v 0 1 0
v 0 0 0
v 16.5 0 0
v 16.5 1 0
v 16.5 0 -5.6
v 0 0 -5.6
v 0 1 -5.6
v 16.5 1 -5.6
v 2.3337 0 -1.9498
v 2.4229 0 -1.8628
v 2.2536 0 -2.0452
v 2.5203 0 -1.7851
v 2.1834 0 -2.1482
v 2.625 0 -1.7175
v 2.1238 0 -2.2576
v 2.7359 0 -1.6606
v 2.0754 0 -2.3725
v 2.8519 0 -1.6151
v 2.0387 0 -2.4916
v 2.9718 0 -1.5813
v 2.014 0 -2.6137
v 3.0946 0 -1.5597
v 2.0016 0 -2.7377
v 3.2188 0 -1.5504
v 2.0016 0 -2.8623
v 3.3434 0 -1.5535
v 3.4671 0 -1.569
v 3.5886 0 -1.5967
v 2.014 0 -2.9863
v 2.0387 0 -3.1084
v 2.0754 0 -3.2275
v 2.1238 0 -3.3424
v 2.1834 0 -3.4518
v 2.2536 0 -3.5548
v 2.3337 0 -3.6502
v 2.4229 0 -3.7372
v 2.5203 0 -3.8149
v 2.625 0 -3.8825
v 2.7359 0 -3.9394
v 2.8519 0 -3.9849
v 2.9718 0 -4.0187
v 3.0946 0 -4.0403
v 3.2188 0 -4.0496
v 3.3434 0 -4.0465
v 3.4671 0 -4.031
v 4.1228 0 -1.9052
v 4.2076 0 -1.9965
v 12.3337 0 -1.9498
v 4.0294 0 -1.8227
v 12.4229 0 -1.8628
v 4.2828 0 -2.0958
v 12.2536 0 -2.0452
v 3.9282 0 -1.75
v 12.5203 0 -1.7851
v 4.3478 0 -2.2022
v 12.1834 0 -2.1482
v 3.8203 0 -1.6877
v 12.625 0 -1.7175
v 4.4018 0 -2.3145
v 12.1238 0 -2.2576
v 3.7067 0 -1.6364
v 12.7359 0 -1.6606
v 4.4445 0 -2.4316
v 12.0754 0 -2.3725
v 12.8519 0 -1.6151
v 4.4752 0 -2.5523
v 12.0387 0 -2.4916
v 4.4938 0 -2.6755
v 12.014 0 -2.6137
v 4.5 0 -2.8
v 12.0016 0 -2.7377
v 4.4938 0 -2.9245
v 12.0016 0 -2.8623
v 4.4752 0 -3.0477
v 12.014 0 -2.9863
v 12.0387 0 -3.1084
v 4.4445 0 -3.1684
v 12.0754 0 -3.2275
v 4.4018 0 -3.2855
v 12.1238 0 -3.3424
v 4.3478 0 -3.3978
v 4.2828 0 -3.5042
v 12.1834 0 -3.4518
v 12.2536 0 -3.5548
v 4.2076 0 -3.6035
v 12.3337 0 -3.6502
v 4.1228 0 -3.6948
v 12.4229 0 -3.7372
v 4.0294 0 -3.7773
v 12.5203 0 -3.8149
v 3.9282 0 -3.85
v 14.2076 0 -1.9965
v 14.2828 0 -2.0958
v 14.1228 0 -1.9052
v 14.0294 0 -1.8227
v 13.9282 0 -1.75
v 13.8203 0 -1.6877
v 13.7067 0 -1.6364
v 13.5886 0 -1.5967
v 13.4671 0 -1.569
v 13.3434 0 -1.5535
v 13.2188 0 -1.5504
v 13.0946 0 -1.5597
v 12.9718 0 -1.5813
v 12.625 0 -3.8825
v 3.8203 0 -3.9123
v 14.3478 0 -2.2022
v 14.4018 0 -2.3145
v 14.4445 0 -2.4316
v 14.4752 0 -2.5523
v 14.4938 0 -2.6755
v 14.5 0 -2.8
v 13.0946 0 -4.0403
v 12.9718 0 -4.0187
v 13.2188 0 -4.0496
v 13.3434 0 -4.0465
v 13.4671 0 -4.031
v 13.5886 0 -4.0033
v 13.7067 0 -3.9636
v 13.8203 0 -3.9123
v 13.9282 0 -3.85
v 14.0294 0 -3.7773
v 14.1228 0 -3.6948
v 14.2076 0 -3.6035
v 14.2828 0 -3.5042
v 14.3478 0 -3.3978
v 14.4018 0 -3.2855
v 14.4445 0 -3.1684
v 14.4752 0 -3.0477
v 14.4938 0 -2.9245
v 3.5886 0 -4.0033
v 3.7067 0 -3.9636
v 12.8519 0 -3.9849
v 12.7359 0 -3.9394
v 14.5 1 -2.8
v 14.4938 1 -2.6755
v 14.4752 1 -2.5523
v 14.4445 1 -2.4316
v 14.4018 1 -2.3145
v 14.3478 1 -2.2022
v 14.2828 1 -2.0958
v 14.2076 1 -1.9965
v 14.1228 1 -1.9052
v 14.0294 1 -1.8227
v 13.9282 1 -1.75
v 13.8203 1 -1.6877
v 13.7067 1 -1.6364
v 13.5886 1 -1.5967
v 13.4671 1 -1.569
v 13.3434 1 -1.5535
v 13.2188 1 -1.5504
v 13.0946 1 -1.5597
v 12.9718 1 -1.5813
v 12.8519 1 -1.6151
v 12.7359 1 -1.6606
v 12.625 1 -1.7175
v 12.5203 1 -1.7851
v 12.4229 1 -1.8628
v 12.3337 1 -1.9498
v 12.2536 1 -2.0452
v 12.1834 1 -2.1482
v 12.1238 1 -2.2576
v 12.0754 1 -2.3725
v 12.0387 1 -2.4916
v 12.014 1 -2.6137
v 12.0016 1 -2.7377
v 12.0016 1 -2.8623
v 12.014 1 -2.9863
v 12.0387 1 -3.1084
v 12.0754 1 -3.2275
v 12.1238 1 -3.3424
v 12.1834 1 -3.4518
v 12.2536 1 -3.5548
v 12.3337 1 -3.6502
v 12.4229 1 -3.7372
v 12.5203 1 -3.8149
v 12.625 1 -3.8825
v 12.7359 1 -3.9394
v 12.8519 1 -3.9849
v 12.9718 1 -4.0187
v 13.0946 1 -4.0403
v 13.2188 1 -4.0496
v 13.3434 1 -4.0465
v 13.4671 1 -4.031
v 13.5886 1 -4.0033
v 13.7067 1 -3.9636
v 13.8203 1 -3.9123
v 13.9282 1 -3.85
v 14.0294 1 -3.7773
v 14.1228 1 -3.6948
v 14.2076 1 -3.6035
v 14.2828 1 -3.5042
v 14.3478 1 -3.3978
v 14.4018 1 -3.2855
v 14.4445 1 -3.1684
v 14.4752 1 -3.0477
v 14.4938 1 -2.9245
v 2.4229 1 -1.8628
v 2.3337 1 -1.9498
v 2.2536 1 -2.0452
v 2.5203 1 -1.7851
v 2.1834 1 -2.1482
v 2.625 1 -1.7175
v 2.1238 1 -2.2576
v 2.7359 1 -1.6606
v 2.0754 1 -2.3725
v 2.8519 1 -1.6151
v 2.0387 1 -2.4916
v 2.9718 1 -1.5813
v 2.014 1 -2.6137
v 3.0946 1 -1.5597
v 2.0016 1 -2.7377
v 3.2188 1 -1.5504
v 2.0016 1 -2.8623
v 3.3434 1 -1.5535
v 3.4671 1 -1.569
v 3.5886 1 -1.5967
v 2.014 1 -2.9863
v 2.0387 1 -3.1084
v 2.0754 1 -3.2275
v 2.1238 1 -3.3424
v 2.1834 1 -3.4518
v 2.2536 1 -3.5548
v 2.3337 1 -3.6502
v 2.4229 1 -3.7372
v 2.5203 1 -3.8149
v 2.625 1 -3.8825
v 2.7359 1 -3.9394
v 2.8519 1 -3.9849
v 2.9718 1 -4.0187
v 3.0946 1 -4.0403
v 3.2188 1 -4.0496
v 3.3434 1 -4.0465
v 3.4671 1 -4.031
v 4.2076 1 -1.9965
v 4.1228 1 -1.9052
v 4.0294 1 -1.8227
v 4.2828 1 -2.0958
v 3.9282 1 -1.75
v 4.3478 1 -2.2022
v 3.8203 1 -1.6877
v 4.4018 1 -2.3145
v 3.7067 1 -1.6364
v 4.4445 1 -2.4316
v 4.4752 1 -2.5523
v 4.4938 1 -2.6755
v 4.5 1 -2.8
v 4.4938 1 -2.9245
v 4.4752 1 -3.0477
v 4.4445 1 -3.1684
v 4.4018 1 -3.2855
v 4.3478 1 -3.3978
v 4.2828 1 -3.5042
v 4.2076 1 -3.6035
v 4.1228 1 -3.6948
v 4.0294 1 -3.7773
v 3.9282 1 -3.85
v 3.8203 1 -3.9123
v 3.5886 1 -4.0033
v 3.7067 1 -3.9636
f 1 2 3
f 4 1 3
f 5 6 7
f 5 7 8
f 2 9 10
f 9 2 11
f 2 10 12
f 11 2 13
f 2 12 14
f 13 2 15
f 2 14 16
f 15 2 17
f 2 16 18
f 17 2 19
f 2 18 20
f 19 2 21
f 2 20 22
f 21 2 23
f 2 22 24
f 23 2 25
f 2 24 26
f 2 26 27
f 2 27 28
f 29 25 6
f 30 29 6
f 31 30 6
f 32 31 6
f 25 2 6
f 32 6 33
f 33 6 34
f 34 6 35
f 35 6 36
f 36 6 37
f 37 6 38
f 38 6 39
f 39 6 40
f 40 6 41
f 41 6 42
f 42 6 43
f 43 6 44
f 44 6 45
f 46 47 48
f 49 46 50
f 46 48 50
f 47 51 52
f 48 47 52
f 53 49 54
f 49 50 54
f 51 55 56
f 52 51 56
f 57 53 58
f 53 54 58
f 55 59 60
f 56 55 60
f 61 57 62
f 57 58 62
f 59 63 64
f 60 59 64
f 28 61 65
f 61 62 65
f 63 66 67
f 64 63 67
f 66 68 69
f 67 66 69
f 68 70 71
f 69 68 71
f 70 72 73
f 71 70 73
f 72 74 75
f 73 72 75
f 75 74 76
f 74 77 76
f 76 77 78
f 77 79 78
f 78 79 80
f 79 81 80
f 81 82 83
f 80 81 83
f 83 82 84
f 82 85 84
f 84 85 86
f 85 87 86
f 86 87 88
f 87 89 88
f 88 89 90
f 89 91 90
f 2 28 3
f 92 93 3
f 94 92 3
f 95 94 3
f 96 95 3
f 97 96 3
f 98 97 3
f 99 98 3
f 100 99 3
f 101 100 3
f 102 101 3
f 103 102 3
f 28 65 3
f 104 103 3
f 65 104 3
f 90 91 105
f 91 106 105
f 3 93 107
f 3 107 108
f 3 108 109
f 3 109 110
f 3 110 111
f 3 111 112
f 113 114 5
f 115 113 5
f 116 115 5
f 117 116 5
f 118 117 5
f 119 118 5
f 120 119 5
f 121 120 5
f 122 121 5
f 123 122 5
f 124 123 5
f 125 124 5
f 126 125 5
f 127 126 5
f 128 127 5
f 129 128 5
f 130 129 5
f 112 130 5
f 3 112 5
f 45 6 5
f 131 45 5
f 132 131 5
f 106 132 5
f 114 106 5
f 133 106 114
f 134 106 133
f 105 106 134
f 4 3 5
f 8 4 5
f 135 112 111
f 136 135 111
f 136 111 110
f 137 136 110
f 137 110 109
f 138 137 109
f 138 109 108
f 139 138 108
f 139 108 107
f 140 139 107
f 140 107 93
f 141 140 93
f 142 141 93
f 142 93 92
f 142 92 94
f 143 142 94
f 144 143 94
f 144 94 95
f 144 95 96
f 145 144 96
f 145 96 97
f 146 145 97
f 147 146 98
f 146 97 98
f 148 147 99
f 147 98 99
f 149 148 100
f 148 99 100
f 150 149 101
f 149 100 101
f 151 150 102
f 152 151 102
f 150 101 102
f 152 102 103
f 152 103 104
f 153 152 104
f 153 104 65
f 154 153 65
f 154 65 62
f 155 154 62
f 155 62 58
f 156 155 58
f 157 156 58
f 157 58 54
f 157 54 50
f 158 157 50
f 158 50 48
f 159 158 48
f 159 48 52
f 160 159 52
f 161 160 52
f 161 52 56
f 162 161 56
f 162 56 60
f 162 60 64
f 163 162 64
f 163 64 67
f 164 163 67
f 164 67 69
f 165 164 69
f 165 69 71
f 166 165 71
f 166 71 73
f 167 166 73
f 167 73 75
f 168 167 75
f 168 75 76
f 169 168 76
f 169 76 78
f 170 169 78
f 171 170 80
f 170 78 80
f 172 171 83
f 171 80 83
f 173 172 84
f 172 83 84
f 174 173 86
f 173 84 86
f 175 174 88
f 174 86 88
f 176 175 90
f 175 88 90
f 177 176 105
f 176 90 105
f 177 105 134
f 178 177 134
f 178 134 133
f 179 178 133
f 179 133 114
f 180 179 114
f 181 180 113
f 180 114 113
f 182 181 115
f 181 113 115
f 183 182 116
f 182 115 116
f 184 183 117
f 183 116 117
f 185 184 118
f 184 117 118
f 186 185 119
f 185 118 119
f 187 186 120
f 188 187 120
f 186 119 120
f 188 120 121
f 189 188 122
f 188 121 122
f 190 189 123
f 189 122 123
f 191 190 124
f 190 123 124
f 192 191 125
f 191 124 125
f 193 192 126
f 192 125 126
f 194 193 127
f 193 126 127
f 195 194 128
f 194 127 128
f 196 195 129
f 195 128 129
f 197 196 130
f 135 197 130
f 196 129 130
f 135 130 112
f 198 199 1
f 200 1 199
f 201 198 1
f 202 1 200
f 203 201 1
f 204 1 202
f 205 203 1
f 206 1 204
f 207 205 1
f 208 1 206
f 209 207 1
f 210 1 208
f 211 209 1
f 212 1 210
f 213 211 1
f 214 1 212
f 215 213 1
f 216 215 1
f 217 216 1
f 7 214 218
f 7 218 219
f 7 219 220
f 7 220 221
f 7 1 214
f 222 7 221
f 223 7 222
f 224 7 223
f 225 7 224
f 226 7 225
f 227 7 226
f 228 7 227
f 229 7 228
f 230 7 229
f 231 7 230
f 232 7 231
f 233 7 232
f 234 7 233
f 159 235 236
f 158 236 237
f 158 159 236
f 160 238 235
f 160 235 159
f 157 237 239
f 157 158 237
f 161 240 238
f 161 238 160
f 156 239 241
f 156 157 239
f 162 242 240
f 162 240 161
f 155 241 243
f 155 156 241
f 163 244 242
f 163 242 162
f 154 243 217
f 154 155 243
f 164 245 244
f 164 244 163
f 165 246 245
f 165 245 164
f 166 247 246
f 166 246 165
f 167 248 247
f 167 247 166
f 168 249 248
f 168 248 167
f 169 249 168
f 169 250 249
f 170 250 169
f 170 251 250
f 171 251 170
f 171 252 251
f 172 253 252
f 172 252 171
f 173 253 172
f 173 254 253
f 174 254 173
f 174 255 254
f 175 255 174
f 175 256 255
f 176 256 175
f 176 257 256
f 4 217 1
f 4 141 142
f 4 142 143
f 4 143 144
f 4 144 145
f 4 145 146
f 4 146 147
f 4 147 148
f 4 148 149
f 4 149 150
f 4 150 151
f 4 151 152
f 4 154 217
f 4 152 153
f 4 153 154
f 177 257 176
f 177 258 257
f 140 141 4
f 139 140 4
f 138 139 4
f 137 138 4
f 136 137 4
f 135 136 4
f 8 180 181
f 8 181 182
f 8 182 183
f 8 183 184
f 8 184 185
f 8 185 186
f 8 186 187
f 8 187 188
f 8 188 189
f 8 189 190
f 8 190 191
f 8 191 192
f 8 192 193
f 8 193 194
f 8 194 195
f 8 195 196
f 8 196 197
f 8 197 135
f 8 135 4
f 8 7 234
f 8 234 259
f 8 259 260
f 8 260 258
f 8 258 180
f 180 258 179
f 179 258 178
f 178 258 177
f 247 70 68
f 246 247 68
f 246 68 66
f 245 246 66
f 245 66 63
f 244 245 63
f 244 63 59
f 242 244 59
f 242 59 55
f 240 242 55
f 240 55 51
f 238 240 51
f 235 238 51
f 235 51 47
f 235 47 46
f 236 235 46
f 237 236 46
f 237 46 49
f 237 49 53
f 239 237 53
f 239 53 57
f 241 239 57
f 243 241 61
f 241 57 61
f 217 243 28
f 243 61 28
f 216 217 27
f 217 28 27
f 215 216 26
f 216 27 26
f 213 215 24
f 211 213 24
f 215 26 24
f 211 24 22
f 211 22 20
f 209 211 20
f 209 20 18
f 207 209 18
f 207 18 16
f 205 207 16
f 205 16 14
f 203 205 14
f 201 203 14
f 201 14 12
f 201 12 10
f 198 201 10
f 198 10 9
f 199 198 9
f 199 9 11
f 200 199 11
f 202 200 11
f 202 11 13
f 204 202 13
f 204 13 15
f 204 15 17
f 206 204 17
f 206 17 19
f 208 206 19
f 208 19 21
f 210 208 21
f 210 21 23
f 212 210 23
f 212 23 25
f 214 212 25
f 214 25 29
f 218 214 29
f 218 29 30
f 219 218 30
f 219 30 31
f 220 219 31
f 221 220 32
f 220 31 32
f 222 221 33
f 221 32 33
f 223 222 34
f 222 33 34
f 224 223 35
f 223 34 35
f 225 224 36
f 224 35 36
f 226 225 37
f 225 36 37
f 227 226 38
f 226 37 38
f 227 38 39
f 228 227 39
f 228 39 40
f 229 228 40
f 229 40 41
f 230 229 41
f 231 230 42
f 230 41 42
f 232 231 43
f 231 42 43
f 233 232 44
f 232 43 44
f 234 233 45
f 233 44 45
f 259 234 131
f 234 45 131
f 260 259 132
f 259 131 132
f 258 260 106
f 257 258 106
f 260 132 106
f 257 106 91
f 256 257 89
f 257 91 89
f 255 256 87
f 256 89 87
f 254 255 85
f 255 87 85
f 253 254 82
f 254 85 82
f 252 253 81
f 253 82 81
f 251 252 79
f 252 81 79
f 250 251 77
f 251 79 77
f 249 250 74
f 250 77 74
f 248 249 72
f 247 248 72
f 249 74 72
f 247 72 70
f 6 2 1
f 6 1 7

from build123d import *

# Parameters (mm, degrees)
SKETCH1_W                 = 16.5
SKETCH1_H                 = 5.6
BOSS_EXTRUDE1_DEPTH       = 1
M3X0_5_TAPPED_HOLE3_D     = 2.5
M3X0_5_TAPPED_HOLE3_DEPTH = 1


with BuildPart() as part:
    # Sketch1 → Boss-Extrude1 (new body)
    with BuildSketch(Plane(origin=(0, 0, 0), x_dir=(1, 0, 0), z_dir=(0, 1, 0))):
        with Locations((8.25, 2.8)):
            Rectangle(SKETCH1_W, SKETCH1_H)
    extrude(amount=BOSS_EXTRUDE1_DEPTH)

    # M3x0.5 Tapped Hole3
    with Locations(Plane(origin=(0, 1, 0), x_dir=(-1, 0, 0), z_dir=(0, 1, 0))):
        with Locations((-3.25, -2.8), (-13.25, -2.8)):
            Hole(M3X0_5_TAPPED_HOLE3_D / 2, depth=M3X0_5_TAPPED_HOLE3_DEPTH)


solid = part.part
